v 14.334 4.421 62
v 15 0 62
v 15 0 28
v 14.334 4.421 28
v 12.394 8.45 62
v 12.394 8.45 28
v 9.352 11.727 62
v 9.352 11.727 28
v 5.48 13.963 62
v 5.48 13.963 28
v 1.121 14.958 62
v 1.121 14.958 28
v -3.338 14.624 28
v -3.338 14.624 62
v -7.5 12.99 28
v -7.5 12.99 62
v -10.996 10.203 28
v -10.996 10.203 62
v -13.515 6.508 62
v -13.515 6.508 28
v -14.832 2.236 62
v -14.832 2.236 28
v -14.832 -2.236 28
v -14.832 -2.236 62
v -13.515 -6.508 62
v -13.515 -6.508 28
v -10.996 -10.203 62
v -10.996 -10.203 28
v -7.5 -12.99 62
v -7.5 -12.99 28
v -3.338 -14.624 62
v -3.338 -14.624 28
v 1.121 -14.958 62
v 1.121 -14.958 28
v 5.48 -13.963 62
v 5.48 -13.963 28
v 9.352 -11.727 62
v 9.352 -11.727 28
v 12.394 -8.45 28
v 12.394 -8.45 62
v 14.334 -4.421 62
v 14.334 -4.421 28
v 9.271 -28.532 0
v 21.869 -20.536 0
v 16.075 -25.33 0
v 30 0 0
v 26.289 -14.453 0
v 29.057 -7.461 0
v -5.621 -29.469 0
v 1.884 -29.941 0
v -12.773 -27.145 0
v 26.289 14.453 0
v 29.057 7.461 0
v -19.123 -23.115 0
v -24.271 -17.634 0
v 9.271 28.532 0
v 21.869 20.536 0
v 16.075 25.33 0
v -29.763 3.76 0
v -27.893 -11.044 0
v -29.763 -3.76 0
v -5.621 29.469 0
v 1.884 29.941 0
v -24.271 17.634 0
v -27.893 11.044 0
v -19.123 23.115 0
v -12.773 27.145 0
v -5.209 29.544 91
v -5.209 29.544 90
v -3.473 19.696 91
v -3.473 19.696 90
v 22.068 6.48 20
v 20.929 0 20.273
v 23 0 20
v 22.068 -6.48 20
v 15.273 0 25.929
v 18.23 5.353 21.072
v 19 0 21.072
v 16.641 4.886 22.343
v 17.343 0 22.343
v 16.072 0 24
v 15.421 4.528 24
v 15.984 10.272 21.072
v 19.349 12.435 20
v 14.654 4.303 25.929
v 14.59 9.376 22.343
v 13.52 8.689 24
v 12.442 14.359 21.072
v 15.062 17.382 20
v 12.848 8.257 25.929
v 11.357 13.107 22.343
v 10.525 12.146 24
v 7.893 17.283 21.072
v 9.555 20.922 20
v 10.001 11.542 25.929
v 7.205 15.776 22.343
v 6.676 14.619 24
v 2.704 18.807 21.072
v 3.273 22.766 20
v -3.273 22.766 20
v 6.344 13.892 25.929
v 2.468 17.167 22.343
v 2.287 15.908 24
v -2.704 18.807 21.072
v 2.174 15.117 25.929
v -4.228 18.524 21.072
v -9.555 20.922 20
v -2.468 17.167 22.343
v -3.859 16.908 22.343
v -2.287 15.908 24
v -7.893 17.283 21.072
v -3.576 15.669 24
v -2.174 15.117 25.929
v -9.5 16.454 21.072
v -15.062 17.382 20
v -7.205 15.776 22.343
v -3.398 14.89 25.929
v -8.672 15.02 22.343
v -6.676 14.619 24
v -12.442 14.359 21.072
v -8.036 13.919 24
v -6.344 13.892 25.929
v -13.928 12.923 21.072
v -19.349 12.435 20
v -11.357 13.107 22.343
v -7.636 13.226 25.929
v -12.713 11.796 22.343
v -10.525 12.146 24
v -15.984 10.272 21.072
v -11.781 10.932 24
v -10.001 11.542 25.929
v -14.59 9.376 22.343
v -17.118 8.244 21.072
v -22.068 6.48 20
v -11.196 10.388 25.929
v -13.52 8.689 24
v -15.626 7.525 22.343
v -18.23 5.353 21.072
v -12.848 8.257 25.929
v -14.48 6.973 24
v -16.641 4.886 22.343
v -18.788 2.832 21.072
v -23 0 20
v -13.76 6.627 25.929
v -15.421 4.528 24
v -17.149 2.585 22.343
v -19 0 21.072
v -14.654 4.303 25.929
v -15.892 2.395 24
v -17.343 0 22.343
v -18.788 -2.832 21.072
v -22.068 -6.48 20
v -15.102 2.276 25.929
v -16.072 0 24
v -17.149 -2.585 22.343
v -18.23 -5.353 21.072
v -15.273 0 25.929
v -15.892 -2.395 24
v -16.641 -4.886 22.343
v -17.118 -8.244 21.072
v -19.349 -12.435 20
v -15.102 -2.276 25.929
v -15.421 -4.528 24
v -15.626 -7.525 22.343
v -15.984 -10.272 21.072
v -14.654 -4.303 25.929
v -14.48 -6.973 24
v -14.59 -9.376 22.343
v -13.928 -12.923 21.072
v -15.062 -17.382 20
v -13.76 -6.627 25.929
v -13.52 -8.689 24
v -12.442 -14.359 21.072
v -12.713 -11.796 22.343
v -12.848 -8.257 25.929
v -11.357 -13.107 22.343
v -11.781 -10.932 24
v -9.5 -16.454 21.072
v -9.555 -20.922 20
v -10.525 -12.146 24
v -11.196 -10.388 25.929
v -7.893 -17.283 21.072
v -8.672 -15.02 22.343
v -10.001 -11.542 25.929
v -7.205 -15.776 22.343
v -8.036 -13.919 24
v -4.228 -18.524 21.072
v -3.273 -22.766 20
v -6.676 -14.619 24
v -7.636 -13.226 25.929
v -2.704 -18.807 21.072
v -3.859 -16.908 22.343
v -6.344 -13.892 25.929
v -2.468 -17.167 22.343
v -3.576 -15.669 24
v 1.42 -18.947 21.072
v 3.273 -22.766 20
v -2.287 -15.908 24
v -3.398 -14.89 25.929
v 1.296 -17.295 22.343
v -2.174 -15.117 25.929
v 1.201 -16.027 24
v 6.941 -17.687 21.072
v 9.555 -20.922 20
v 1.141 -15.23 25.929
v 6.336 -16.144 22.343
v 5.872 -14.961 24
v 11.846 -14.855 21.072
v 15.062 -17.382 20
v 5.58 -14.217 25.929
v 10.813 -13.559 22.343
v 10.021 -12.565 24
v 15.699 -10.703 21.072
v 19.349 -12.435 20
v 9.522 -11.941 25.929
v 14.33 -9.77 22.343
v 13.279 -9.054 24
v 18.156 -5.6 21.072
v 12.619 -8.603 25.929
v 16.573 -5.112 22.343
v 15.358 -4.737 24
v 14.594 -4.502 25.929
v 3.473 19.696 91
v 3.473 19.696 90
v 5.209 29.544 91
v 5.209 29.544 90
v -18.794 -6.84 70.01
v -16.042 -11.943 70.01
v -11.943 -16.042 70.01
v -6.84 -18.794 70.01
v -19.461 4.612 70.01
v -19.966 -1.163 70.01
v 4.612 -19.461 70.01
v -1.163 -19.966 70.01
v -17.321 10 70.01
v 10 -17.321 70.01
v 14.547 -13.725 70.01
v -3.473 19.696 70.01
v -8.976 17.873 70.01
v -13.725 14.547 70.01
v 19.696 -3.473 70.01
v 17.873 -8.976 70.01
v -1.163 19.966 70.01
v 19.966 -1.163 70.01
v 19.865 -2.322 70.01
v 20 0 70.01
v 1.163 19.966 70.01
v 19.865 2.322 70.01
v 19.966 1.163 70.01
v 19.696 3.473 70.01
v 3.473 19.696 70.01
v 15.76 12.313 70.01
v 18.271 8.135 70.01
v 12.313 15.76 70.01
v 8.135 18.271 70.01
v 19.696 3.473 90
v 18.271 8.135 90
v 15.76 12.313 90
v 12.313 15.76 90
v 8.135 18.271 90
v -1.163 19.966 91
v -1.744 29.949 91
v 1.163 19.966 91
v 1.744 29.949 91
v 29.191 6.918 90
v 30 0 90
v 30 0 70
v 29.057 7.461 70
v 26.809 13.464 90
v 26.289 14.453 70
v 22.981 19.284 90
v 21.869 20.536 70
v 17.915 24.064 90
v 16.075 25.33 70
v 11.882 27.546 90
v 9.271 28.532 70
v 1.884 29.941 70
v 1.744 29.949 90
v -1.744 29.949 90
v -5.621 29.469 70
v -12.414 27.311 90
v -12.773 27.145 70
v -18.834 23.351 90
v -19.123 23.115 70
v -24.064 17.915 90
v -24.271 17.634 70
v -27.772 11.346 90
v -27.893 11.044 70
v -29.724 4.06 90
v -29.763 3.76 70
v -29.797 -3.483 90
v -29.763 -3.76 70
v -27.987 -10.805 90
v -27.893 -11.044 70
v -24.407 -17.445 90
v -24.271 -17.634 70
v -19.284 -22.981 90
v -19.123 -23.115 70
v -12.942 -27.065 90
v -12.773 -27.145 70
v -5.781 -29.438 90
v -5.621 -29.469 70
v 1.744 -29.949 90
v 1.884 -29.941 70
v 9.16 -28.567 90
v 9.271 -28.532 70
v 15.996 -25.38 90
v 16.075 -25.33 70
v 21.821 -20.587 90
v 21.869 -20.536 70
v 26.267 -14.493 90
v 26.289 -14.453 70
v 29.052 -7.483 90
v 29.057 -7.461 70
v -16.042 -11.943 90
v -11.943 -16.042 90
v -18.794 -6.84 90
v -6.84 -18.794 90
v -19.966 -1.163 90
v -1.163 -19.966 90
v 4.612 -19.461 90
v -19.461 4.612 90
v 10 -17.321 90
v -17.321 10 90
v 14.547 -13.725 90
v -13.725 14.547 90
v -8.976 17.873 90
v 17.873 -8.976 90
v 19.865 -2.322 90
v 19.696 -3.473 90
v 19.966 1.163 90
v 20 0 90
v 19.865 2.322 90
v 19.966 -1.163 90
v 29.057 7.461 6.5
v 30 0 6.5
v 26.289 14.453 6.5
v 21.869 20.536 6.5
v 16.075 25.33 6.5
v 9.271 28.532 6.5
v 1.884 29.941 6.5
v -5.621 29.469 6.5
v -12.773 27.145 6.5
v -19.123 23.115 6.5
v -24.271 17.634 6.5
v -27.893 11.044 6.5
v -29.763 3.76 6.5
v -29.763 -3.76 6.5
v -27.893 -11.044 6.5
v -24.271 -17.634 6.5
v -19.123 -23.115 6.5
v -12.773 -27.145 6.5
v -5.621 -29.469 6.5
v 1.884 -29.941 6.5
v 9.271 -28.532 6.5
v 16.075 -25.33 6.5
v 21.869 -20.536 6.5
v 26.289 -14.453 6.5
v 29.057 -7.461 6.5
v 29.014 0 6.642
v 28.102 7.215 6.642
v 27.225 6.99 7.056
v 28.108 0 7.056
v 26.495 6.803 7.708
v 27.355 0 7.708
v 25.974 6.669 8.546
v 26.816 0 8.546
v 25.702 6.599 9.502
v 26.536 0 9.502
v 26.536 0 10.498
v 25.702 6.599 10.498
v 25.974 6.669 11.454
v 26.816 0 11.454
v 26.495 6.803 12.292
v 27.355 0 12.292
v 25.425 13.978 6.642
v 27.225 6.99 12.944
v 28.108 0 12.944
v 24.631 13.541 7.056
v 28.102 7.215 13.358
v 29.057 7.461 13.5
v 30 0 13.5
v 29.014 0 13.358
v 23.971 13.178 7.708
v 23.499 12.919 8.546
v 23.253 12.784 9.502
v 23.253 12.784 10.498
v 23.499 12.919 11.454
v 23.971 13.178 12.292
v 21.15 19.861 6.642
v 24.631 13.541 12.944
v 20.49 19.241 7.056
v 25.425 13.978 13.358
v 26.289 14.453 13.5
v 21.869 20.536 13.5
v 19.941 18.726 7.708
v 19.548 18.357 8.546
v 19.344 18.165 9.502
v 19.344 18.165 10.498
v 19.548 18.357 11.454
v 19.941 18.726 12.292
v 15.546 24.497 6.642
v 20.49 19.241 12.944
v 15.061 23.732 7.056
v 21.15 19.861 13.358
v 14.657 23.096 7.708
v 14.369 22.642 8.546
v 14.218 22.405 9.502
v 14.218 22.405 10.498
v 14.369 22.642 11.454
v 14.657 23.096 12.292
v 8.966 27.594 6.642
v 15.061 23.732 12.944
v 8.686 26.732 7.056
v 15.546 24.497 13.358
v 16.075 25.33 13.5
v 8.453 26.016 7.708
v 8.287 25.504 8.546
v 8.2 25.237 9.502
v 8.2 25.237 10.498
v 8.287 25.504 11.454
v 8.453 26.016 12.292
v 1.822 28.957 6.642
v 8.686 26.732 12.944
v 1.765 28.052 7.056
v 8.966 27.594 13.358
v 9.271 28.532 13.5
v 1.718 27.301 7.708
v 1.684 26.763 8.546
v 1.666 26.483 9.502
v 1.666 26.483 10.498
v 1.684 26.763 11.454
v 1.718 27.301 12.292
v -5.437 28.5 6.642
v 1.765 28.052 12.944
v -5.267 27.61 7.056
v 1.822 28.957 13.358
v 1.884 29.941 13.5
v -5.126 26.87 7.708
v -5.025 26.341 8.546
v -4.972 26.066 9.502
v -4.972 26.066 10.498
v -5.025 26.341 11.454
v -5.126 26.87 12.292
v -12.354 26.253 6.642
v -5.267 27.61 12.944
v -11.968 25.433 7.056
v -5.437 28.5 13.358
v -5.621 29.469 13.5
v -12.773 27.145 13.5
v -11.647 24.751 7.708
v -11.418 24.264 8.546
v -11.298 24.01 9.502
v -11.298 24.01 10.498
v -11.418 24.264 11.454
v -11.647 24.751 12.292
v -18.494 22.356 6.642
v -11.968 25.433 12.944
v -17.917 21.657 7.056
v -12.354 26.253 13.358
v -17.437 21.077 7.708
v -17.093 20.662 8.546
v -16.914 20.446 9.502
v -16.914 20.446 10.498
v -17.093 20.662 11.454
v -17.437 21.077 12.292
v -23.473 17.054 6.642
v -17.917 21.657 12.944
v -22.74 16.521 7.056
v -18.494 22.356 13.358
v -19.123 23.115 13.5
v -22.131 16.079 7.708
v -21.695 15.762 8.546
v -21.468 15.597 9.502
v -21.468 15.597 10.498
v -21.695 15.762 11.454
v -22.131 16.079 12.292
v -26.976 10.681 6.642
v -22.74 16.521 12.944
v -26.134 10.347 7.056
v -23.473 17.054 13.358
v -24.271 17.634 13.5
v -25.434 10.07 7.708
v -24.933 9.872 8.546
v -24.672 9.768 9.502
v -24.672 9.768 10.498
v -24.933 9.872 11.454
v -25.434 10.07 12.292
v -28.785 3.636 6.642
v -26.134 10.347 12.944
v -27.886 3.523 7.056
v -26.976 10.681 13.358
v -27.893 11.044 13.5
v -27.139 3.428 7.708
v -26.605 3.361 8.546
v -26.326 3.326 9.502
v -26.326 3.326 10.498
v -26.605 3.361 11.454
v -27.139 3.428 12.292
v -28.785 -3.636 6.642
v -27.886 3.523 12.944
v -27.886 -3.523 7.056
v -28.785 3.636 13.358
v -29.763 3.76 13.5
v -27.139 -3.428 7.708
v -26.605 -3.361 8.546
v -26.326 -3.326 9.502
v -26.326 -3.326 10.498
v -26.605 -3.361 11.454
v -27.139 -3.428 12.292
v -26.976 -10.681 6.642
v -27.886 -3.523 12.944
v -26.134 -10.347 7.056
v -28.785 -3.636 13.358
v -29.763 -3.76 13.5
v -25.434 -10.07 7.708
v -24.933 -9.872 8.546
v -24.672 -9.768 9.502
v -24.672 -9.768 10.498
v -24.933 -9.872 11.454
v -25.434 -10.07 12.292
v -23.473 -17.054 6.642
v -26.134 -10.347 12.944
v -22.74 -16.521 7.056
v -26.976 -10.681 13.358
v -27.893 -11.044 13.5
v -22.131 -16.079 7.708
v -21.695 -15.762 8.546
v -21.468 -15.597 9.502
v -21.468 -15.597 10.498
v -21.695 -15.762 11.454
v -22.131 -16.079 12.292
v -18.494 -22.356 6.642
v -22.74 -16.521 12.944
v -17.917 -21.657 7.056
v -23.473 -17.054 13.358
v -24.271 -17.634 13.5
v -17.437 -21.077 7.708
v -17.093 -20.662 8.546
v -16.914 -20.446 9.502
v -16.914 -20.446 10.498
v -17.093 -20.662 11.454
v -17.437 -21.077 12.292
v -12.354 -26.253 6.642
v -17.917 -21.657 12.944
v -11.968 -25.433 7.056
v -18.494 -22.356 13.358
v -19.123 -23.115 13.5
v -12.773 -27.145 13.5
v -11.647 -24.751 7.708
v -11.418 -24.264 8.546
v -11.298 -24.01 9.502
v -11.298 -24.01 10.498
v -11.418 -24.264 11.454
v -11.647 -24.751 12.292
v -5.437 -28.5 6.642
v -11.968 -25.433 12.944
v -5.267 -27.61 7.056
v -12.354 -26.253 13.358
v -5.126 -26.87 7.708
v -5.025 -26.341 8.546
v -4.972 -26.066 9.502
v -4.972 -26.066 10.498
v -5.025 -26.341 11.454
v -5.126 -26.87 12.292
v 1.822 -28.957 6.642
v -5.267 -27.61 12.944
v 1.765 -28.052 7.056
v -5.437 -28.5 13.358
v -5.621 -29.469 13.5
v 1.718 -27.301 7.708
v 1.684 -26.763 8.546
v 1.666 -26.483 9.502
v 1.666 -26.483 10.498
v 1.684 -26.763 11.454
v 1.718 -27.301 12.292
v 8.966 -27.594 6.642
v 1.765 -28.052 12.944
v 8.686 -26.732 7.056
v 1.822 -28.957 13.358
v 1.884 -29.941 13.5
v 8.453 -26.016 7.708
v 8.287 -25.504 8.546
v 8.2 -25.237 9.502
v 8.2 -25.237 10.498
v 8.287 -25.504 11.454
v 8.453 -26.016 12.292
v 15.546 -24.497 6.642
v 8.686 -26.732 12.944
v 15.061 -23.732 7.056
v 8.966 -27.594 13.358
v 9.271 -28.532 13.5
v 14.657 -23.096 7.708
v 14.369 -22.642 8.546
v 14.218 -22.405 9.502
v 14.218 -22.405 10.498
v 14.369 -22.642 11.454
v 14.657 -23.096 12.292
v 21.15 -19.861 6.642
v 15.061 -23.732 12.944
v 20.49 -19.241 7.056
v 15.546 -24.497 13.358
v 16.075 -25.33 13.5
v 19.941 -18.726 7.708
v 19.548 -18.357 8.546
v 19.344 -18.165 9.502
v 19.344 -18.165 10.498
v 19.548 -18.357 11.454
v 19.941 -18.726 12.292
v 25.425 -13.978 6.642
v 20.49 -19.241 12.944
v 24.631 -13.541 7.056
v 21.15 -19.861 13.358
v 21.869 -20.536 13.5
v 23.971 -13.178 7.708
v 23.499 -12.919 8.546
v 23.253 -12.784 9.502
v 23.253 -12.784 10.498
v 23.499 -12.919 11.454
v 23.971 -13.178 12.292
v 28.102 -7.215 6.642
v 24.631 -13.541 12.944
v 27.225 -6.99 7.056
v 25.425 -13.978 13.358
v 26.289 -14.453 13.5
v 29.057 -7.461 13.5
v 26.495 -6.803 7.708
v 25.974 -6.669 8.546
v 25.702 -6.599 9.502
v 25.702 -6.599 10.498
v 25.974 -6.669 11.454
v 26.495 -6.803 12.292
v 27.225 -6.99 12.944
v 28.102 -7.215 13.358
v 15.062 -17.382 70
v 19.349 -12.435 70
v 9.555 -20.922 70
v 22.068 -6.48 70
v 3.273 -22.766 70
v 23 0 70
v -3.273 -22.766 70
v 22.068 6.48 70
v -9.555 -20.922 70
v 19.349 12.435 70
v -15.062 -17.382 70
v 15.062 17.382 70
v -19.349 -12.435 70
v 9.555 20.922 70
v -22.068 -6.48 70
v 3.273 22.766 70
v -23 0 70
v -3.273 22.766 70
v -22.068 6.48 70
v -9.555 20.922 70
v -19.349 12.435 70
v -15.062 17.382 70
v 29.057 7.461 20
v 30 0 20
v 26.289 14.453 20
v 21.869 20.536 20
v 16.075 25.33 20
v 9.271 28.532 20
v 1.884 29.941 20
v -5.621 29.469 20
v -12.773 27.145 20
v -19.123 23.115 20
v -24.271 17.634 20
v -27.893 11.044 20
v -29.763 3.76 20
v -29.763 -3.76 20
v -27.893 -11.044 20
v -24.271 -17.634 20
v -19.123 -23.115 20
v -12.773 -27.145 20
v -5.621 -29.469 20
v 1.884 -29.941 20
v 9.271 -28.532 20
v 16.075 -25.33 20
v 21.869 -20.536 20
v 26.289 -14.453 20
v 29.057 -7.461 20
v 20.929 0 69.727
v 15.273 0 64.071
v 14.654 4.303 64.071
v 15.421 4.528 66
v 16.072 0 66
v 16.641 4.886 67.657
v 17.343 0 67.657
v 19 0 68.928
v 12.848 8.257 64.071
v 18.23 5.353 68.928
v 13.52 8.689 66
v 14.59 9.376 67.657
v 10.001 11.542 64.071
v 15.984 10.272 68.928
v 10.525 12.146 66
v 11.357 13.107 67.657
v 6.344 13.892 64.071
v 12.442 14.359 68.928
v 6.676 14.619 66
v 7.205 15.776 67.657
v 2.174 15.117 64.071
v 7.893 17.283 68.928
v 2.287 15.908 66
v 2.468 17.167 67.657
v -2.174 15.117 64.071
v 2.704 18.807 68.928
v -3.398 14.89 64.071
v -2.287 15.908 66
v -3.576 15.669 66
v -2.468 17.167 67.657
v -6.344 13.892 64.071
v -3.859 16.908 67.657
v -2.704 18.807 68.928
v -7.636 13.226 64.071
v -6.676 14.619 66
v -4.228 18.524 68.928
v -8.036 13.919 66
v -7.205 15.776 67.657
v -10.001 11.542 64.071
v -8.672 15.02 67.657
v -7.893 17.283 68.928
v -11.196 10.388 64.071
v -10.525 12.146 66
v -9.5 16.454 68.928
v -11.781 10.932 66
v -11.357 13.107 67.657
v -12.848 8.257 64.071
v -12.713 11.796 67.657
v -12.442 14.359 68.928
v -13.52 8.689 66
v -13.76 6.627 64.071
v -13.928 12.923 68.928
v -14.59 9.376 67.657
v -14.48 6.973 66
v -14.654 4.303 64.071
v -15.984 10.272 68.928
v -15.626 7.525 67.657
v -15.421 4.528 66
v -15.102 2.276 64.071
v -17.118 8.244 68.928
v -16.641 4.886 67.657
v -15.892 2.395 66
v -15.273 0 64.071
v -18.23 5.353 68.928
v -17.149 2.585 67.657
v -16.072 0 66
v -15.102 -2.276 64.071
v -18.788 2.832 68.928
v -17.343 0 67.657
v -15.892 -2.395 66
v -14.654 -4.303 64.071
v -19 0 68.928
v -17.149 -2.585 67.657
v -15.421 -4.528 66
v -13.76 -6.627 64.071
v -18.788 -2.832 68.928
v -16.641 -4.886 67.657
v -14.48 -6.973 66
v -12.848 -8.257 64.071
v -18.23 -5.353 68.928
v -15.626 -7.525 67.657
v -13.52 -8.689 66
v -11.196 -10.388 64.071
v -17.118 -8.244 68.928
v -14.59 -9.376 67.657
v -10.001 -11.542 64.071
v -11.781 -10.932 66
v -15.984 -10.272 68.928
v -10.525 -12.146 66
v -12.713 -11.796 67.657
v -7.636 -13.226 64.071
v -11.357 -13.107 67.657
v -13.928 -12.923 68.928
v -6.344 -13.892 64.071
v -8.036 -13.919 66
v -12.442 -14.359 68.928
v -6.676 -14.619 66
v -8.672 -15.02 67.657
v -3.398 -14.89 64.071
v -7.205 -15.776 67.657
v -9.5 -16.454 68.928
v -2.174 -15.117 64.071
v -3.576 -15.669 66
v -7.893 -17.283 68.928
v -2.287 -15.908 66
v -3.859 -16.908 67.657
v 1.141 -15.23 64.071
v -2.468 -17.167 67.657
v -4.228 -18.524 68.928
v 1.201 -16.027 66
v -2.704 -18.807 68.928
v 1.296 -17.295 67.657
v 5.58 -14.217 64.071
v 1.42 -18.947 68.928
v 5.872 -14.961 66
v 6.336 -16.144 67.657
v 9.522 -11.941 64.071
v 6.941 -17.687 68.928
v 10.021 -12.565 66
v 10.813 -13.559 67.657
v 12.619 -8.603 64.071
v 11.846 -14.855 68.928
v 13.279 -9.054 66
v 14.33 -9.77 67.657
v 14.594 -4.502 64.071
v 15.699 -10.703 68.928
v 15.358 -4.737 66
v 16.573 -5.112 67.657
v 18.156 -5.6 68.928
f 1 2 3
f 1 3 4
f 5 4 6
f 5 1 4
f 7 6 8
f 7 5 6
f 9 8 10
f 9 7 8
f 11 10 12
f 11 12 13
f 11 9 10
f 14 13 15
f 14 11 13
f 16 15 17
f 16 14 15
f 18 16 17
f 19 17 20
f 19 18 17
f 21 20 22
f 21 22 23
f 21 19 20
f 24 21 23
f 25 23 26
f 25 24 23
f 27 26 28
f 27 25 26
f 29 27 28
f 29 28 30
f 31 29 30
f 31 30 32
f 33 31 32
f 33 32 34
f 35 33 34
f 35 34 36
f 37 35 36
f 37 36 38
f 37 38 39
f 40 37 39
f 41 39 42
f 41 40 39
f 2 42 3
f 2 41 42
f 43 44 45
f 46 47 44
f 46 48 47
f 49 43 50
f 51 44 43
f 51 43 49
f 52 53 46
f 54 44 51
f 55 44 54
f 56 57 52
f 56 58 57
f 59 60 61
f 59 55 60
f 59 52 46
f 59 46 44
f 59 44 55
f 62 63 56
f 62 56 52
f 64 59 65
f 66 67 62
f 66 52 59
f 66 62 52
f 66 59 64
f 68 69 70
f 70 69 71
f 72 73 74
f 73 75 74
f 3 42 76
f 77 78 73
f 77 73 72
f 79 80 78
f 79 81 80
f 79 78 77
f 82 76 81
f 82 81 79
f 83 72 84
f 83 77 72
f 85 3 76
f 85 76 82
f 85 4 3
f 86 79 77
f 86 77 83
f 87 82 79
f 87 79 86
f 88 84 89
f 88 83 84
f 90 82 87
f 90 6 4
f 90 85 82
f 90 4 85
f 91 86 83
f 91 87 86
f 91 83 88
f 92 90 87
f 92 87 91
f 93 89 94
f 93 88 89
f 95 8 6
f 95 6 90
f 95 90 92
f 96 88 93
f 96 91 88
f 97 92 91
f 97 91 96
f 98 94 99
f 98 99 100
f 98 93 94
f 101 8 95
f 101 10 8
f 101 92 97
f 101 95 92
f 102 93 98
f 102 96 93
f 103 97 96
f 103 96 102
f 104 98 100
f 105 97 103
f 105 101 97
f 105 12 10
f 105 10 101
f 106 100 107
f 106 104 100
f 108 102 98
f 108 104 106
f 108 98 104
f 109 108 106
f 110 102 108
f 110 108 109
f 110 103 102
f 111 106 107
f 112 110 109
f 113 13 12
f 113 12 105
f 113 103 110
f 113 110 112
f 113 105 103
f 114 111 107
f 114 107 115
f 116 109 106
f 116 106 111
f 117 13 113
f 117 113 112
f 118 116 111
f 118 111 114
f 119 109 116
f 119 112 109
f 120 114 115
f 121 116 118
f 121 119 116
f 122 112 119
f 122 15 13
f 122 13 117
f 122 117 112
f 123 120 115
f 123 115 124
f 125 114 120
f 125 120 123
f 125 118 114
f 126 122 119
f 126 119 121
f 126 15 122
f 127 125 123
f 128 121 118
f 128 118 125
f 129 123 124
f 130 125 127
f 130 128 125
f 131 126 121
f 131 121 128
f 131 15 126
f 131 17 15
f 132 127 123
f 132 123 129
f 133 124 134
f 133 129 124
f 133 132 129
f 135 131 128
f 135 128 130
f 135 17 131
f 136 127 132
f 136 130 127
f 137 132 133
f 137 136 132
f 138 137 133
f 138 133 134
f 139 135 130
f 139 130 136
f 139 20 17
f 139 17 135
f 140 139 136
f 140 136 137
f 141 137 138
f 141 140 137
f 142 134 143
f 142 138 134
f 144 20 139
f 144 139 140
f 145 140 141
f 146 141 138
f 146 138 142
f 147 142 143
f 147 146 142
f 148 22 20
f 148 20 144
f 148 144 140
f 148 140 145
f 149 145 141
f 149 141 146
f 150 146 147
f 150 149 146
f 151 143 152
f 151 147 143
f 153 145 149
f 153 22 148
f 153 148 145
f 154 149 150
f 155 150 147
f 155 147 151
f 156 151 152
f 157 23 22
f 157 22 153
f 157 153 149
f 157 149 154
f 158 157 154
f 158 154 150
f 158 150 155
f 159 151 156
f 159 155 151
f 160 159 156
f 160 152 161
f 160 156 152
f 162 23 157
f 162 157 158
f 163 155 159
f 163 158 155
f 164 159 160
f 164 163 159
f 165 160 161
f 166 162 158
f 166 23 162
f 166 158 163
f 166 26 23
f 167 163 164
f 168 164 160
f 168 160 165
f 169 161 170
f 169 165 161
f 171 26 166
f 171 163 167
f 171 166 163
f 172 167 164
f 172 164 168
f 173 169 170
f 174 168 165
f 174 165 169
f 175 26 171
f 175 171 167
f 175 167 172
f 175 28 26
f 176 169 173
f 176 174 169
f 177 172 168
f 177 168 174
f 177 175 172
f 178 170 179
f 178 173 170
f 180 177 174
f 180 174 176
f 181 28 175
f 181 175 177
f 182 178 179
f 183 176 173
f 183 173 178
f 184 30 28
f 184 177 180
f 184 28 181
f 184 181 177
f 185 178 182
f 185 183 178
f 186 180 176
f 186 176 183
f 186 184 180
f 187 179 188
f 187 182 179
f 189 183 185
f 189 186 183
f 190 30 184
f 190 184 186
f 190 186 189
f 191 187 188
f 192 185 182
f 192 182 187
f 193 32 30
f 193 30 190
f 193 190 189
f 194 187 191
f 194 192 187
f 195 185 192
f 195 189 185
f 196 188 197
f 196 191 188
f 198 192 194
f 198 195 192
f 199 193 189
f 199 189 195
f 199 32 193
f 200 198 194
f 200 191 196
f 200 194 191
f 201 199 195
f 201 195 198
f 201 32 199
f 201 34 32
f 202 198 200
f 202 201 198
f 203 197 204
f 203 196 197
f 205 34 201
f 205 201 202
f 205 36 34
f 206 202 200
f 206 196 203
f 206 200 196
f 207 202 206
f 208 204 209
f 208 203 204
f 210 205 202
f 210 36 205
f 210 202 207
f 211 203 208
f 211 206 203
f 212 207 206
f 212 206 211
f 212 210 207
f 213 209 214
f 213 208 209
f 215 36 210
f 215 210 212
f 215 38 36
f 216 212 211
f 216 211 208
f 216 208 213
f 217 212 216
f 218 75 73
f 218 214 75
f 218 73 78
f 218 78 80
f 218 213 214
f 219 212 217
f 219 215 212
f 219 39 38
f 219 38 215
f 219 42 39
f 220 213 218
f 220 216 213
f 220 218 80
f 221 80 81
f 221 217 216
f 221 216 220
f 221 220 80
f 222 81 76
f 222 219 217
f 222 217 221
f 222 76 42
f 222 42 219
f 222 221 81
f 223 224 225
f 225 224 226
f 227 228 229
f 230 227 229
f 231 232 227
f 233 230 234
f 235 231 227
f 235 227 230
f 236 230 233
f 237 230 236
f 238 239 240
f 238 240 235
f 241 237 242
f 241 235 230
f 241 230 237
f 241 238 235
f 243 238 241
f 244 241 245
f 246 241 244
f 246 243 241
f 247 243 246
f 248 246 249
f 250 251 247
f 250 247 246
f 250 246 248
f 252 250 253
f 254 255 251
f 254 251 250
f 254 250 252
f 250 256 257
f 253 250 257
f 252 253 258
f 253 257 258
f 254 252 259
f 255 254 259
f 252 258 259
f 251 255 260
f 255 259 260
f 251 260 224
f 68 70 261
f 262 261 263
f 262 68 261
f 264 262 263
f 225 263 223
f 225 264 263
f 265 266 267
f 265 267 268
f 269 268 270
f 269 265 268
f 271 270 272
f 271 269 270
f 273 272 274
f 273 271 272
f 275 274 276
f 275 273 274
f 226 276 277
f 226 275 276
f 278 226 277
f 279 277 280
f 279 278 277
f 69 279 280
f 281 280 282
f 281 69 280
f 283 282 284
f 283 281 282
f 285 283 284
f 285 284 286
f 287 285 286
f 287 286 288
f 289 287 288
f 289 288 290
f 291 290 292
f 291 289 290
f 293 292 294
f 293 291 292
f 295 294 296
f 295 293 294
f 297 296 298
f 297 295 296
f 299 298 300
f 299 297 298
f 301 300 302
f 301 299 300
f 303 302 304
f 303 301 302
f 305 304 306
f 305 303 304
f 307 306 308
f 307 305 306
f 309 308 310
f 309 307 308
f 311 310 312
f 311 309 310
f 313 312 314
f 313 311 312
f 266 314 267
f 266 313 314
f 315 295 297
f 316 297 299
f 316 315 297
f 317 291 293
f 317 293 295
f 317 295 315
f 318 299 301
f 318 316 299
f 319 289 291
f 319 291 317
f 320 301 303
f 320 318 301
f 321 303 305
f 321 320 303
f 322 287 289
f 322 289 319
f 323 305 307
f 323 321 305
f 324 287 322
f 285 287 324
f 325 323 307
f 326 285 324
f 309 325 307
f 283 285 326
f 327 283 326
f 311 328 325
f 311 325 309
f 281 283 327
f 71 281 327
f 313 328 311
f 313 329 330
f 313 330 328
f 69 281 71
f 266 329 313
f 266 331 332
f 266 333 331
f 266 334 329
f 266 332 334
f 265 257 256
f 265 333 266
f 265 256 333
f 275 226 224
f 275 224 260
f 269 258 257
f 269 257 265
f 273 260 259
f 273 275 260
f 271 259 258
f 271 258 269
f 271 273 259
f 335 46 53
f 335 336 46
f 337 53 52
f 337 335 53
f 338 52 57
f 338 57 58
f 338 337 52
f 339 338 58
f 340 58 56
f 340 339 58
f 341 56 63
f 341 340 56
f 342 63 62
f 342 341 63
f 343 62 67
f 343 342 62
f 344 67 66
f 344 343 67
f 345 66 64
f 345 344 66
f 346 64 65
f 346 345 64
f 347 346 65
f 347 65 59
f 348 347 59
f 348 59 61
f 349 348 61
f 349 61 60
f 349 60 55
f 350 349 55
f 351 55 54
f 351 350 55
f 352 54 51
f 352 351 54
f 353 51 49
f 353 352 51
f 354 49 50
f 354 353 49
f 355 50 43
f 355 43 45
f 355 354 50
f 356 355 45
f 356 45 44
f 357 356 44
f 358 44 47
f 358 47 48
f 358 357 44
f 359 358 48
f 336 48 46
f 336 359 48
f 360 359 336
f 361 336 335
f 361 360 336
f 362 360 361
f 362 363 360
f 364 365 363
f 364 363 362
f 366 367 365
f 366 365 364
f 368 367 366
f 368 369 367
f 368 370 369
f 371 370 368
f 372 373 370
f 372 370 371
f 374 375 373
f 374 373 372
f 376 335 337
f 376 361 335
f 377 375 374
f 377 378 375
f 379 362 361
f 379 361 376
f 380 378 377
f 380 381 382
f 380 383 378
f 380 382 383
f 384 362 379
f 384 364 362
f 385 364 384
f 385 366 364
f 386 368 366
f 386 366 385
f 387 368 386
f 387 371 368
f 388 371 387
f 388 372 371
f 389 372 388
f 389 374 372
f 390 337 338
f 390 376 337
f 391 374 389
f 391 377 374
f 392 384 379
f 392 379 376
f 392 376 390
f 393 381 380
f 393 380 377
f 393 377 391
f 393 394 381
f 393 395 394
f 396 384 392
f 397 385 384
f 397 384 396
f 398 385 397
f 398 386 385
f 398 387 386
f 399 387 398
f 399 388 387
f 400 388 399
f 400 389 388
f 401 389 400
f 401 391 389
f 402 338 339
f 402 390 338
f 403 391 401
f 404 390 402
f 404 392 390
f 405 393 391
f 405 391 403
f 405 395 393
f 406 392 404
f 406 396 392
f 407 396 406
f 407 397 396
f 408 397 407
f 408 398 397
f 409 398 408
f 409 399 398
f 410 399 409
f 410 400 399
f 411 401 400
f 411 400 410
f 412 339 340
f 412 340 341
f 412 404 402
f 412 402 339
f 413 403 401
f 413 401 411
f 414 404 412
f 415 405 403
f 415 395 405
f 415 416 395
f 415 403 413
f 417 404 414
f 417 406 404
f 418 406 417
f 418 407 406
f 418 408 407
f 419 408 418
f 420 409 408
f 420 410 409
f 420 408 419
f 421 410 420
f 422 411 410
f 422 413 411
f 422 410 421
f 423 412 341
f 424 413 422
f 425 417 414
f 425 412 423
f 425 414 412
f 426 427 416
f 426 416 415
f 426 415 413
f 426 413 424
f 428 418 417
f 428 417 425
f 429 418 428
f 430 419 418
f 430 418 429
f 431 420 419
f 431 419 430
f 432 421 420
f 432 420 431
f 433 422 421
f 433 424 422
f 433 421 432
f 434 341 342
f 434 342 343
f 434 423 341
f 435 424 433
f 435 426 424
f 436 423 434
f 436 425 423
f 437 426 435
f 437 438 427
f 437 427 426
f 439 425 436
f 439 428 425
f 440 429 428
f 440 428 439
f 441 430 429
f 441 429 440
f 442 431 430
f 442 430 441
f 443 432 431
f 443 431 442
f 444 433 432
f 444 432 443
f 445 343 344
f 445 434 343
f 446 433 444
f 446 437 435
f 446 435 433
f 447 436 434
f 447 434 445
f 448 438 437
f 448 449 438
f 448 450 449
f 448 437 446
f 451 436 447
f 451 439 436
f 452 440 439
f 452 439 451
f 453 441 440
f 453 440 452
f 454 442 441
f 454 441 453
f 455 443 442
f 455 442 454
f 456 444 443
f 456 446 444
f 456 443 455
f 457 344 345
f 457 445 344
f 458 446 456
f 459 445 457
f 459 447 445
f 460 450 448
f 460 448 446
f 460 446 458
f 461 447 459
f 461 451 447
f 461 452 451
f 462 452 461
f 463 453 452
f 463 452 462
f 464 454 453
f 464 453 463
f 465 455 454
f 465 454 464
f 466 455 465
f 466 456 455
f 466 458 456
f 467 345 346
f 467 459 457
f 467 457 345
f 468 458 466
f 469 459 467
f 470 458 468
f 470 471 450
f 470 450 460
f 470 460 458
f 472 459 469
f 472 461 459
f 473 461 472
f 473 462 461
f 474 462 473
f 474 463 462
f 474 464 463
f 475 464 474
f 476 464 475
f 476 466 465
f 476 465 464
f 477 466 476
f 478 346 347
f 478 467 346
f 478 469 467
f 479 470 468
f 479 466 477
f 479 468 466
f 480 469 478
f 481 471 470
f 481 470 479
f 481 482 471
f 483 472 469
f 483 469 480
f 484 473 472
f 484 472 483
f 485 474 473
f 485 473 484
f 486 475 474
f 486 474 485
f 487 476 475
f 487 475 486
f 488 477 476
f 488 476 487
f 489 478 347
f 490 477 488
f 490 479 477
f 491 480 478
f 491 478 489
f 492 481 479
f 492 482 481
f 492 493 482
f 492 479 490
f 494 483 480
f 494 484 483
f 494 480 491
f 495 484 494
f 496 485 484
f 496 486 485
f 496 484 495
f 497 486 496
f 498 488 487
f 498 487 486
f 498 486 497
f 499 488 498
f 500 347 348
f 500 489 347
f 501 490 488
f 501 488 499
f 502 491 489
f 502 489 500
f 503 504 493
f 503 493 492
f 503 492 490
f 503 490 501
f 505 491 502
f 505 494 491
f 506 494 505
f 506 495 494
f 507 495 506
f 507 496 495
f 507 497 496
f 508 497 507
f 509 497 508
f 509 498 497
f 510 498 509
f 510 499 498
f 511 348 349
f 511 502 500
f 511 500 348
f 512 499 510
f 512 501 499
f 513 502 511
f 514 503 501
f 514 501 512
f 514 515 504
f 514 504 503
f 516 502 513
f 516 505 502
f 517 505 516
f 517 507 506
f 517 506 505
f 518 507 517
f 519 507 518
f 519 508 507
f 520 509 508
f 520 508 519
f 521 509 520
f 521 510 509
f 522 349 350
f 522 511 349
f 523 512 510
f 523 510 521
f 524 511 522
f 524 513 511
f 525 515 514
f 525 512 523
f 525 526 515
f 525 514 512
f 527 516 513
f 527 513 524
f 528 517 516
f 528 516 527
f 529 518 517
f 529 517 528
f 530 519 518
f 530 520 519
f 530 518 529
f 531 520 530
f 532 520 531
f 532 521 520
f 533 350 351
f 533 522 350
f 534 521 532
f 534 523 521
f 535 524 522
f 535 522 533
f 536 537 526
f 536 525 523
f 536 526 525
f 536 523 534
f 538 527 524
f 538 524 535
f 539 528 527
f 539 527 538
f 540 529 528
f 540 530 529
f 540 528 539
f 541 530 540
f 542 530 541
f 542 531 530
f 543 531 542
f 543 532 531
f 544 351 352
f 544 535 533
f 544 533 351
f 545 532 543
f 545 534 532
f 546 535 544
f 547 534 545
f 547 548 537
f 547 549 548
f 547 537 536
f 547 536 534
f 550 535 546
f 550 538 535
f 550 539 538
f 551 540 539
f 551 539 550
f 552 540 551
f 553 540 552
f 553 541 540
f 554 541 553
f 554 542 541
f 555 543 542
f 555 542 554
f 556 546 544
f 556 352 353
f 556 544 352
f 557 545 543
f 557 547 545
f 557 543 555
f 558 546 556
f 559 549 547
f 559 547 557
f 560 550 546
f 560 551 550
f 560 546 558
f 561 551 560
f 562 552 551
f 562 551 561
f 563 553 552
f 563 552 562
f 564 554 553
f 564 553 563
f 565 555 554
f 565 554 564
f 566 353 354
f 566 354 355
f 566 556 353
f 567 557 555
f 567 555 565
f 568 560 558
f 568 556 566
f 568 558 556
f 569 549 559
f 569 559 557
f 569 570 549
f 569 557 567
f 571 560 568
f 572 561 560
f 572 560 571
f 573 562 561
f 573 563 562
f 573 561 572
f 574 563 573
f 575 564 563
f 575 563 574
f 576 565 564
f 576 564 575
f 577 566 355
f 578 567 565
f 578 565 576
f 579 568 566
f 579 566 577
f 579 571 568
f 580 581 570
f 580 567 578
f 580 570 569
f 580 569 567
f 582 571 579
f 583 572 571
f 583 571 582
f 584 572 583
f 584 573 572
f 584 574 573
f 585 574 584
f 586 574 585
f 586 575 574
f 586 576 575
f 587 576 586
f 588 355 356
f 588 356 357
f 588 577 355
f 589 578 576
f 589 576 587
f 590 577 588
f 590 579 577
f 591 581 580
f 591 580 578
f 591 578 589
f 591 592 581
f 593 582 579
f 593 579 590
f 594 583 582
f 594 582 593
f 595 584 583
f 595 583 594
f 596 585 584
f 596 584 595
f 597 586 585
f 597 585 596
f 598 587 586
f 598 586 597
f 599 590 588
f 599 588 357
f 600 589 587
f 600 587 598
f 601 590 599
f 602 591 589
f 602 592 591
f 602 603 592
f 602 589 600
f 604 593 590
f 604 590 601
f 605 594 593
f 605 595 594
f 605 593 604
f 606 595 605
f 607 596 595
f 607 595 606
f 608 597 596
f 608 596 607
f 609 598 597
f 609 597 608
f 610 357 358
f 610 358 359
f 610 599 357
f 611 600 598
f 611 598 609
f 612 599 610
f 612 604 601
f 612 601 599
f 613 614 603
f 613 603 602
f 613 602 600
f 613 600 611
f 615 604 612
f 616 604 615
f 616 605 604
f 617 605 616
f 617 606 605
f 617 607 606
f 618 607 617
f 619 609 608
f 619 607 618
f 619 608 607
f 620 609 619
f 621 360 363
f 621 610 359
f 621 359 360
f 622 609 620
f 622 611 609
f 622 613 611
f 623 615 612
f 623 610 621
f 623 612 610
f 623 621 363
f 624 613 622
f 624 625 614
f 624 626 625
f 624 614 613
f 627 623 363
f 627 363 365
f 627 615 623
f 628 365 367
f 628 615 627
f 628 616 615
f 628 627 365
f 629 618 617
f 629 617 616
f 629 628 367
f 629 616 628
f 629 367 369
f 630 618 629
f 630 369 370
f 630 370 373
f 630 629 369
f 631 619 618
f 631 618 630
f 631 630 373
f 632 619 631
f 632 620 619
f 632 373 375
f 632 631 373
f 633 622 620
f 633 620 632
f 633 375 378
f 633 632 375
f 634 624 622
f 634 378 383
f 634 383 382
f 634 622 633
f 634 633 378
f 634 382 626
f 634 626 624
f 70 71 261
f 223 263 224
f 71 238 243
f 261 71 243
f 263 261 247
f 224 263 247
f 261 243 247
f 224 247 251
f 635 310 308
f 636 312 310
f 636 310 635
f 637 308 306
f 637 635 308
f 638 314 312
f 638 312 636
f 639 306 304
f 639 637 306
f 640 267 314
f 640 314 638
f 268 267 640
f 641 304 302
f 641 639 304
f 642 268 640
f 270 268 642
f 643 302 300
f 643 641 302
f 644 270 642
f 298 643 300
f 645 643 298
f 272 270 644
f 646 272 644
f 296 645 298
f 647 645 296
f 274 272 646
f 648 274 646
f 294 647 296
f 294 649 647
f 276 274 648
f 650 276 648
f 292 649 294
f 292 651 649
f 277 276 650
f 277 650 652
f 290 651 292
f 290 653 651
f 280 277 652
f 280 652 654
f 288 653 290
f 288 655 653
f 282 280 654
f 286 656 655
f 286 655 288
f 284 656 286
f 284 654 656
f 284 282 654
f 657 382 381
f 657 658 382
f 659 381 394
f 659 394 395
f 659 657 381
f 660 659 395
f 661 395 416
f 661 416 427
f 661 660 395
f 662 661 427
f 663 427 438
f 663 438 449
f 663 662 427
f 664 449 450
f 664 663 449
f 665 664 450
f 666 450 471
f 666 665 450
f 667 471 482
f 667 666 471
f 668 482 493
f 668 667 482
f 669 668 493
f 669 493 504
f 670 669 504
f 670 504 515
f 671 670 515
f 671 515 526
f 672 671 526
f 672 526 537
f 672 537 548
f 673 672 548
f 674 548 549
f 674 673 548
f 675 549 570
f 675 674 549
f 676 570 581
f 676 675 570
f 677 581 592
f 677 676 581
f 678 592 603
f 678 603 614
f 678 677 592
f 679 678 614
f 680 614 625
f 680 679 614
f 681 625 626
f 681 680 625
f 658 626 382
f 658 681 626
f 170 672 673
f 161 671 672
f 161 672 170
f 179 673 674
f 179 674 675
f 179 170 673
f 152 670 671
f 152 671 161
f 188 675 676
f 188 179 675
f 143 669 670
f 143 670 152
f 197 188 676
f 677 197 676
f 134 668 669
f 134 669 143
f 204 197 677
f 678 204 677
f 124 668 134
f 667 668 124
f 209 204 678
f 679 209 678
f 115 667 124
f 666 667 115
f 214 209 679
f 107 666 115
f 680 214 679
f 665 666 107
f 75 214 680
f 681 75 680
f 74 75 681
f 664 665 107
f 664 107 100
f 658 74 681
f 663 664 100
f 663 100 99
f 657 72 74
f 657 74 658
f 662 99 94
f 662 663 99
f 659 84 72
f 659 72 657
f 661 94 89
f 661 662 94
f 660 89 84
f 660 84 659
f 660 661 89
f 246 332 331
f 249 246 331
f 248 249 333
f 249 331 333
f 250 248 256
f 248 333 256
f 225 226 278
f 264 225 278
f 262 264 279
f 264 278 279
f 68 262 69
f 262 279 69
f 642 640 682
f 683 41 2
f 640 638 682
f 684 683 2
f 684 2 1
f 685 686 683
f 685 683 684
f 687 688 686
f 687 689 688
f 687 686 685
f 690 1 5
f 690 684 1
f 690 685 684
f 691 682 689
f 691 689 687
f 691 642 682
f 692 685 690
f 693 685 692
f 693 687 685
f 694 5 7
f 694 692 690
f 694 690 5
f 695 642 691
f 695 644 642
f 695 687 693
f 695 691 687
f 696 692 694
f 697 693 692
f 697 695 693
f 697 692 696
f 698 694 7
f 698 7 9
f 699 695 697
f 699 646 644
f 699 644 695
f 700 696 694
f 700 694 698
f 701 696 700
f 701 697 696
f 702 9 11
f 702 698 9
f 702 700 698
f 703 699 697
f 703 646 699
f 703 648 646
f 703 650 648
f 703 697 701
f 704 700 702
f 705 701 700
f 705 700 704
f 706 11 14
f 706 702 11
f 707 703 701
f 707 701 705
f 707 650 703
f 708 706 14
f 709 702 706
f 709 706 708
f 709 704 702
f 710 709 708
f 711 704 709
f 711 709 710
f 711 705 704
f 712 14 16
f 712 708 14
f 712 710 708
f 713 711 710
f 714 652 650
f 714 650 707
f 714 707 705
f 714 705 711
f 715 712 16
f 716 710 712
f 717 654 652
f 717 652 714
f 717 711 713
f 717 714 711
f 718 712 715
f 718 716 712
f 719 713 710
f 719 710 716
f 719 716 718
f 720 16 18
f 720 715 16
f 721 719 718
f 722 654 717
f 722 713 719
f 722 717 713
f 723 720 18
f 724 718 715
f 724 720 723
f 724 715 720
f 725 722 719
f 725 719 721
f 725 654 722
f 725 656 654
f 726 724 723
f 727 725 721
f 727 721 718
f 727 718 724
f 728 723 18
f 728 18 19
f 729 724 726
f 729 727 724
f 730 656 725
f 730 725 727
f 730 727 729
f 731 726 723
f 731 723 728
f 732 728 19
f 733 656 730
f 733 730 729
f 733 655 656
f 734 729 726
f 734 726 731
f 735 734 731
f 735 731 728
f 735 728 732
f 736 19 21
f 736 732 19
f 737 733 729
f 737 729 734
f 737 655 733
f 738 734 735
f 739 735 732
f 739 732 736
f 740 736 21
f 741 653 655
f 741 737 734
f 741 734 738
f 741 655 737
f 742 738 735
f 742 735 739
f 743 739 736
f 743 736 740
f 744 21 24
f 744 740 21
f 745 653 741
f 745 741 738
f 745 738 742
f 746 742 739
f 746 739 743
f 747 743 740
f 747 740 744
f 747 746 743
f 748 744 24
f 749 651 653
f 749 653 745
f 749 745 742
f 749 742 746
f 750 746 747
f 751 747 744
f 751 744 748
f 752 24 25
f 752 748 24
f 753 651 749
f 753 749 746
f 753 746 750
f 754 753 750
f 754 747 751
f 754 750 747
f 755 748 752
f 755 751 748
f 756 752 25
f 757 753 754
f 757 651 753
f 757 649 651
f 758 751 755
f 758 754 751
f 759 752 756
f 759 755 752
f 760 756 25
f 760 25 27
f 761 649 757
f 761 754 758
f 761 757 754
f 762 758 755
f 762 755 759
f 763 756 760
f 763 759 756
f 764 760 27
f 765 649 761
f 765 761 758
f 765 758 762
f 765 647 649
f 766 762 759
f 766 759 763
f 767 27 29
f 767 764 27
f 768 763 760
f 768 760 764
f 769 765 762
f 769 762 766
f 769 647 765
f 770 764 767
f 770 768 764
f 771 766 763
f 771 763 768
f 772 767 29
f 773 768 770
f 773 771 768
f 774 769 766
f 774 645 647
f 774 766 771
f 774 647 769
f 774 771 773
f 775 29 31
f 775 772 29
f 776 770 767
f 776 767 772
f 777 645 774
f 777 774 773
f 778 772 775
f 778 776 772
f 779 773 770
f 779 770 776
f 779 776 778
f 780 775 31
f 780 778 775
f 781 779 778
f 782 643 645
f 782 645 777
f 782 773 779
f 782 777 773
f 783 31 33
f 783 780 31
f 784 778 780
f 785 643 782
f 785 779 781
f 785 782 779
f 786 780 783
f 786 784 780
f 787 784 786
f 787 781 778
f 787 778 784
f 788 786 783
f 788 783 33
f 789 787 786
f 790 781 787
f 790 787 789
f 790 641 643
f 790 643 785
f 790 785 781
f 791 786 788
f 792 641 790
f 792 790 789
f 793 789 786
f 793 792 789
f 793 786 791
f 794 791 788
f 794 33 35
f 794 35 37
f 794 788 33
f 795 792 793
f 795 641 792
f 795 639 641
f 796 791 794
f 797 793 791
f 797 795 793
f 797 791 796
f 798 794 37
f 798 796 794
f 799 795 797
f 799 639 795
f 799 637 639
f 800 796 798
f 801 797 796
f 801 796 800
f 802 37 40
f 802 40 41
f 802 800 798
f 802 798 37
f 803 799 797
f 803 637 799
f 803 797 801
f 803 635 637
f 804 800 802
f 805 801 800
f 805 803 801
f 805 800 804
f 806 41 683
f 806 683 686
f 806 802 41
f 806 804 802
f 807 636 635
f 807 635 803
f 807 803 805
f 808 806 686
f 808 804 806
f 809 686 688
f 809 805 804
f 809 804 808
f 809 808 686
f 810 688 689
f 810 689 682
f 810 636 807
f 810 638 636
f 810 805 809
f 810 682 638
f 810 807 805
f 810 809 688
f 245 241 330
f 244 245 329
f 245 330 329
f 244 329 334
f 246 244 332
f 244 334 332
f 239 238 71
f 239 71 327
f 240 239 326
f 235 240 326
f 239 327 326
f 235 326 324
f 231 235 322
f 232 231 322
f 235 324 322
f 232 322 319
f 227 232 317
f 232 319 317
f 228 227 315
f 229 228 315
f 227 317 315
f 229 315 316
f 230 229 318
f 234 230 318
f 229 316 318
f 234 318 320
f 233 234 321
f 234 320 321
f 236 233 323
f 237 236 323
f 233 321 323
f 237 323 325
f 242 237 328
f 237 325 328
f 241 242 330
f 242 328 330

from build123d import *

# Parameters (mm, degrees)
F3_DEPTH = 19.99
F4_R     = 8
F5_DEPTH = 1


with BuildPart() as f1:
    # F0 (on Front) → F1 (revolve)
    with BuildSketch(Plane.XZ):
        with BuildLine():
            Line((0, 90), (0, 0))
            Line((0, 0), (30, 0))
            Line((30, 0), (30, 6.5))
            ThreePointArc((30, 6.5), (26.5, 10), (30, 13.5))
            Line((30, 13.5), (30, 20))
            Line((30, 20), (15, 20))
            Line((15, 20), (15, 70))
            Line((15, 70), (30, 70))
            Line((30, 70), (30, 90))
            Line((30, 90), (0, 90))
        make_face()
    revolve(axis=Axis((0, 0, 45), (0, 0, 1)))

    # F2 (on face) → F3 (cut)
    with BuildSketch(Plane.XY.offset(90)):
        with BuildLine():
            ThreePointArc((20, 0), (19.923894, 1.743115), (19.696155, 3.472964))
            ThreePointArc((19.696155, 3.472964), (14.142136, 14.142136), (3.472964, 19.696155))
            ThreePointArc((3.472964, 19.696155), (0, 20), (-3.472964, 19.696155))
            ThreePointArc((-3.472964, 19.696155), (-14.142136, -14.142136), (19.696155, -3.472964))
            ThreePointArc((19.696155, -3.472964), (19.923894, -1.743115), (20, 0))
        make_face()
    extrude(amount=-F3_DEPTH, mode=Mode.SUBTRACT)

    # F4
    f4_edges = [f1.edges().sort_by_distance(p)[0] for p in [
        (-15, 0, 20),
        (-15, 0, 70),
        (15, 0, 45),
    ]]
    fillet(f4_edges, radius=F4_R)

    # F2 (on face) → F5 (join)
    with BuildSketch(Plane.XY.offset(90)):
        with BuildLine():
            Line((3.472964, 19.696155), (5.209445, 29.544233))
            ThreePointArc((5.209445, 29.544233), (0, 30), (-5.209445, 29.544233))
            Line((-5.209445, 29.544233), (-3.472964, 19.696155))
            ThreePointArc((-3.472964, 19.696155), (0, 20), (3.472964, 19.696155))
        make_face()
    extrude(amount=F5_DEPTH)


solid = f1.part
